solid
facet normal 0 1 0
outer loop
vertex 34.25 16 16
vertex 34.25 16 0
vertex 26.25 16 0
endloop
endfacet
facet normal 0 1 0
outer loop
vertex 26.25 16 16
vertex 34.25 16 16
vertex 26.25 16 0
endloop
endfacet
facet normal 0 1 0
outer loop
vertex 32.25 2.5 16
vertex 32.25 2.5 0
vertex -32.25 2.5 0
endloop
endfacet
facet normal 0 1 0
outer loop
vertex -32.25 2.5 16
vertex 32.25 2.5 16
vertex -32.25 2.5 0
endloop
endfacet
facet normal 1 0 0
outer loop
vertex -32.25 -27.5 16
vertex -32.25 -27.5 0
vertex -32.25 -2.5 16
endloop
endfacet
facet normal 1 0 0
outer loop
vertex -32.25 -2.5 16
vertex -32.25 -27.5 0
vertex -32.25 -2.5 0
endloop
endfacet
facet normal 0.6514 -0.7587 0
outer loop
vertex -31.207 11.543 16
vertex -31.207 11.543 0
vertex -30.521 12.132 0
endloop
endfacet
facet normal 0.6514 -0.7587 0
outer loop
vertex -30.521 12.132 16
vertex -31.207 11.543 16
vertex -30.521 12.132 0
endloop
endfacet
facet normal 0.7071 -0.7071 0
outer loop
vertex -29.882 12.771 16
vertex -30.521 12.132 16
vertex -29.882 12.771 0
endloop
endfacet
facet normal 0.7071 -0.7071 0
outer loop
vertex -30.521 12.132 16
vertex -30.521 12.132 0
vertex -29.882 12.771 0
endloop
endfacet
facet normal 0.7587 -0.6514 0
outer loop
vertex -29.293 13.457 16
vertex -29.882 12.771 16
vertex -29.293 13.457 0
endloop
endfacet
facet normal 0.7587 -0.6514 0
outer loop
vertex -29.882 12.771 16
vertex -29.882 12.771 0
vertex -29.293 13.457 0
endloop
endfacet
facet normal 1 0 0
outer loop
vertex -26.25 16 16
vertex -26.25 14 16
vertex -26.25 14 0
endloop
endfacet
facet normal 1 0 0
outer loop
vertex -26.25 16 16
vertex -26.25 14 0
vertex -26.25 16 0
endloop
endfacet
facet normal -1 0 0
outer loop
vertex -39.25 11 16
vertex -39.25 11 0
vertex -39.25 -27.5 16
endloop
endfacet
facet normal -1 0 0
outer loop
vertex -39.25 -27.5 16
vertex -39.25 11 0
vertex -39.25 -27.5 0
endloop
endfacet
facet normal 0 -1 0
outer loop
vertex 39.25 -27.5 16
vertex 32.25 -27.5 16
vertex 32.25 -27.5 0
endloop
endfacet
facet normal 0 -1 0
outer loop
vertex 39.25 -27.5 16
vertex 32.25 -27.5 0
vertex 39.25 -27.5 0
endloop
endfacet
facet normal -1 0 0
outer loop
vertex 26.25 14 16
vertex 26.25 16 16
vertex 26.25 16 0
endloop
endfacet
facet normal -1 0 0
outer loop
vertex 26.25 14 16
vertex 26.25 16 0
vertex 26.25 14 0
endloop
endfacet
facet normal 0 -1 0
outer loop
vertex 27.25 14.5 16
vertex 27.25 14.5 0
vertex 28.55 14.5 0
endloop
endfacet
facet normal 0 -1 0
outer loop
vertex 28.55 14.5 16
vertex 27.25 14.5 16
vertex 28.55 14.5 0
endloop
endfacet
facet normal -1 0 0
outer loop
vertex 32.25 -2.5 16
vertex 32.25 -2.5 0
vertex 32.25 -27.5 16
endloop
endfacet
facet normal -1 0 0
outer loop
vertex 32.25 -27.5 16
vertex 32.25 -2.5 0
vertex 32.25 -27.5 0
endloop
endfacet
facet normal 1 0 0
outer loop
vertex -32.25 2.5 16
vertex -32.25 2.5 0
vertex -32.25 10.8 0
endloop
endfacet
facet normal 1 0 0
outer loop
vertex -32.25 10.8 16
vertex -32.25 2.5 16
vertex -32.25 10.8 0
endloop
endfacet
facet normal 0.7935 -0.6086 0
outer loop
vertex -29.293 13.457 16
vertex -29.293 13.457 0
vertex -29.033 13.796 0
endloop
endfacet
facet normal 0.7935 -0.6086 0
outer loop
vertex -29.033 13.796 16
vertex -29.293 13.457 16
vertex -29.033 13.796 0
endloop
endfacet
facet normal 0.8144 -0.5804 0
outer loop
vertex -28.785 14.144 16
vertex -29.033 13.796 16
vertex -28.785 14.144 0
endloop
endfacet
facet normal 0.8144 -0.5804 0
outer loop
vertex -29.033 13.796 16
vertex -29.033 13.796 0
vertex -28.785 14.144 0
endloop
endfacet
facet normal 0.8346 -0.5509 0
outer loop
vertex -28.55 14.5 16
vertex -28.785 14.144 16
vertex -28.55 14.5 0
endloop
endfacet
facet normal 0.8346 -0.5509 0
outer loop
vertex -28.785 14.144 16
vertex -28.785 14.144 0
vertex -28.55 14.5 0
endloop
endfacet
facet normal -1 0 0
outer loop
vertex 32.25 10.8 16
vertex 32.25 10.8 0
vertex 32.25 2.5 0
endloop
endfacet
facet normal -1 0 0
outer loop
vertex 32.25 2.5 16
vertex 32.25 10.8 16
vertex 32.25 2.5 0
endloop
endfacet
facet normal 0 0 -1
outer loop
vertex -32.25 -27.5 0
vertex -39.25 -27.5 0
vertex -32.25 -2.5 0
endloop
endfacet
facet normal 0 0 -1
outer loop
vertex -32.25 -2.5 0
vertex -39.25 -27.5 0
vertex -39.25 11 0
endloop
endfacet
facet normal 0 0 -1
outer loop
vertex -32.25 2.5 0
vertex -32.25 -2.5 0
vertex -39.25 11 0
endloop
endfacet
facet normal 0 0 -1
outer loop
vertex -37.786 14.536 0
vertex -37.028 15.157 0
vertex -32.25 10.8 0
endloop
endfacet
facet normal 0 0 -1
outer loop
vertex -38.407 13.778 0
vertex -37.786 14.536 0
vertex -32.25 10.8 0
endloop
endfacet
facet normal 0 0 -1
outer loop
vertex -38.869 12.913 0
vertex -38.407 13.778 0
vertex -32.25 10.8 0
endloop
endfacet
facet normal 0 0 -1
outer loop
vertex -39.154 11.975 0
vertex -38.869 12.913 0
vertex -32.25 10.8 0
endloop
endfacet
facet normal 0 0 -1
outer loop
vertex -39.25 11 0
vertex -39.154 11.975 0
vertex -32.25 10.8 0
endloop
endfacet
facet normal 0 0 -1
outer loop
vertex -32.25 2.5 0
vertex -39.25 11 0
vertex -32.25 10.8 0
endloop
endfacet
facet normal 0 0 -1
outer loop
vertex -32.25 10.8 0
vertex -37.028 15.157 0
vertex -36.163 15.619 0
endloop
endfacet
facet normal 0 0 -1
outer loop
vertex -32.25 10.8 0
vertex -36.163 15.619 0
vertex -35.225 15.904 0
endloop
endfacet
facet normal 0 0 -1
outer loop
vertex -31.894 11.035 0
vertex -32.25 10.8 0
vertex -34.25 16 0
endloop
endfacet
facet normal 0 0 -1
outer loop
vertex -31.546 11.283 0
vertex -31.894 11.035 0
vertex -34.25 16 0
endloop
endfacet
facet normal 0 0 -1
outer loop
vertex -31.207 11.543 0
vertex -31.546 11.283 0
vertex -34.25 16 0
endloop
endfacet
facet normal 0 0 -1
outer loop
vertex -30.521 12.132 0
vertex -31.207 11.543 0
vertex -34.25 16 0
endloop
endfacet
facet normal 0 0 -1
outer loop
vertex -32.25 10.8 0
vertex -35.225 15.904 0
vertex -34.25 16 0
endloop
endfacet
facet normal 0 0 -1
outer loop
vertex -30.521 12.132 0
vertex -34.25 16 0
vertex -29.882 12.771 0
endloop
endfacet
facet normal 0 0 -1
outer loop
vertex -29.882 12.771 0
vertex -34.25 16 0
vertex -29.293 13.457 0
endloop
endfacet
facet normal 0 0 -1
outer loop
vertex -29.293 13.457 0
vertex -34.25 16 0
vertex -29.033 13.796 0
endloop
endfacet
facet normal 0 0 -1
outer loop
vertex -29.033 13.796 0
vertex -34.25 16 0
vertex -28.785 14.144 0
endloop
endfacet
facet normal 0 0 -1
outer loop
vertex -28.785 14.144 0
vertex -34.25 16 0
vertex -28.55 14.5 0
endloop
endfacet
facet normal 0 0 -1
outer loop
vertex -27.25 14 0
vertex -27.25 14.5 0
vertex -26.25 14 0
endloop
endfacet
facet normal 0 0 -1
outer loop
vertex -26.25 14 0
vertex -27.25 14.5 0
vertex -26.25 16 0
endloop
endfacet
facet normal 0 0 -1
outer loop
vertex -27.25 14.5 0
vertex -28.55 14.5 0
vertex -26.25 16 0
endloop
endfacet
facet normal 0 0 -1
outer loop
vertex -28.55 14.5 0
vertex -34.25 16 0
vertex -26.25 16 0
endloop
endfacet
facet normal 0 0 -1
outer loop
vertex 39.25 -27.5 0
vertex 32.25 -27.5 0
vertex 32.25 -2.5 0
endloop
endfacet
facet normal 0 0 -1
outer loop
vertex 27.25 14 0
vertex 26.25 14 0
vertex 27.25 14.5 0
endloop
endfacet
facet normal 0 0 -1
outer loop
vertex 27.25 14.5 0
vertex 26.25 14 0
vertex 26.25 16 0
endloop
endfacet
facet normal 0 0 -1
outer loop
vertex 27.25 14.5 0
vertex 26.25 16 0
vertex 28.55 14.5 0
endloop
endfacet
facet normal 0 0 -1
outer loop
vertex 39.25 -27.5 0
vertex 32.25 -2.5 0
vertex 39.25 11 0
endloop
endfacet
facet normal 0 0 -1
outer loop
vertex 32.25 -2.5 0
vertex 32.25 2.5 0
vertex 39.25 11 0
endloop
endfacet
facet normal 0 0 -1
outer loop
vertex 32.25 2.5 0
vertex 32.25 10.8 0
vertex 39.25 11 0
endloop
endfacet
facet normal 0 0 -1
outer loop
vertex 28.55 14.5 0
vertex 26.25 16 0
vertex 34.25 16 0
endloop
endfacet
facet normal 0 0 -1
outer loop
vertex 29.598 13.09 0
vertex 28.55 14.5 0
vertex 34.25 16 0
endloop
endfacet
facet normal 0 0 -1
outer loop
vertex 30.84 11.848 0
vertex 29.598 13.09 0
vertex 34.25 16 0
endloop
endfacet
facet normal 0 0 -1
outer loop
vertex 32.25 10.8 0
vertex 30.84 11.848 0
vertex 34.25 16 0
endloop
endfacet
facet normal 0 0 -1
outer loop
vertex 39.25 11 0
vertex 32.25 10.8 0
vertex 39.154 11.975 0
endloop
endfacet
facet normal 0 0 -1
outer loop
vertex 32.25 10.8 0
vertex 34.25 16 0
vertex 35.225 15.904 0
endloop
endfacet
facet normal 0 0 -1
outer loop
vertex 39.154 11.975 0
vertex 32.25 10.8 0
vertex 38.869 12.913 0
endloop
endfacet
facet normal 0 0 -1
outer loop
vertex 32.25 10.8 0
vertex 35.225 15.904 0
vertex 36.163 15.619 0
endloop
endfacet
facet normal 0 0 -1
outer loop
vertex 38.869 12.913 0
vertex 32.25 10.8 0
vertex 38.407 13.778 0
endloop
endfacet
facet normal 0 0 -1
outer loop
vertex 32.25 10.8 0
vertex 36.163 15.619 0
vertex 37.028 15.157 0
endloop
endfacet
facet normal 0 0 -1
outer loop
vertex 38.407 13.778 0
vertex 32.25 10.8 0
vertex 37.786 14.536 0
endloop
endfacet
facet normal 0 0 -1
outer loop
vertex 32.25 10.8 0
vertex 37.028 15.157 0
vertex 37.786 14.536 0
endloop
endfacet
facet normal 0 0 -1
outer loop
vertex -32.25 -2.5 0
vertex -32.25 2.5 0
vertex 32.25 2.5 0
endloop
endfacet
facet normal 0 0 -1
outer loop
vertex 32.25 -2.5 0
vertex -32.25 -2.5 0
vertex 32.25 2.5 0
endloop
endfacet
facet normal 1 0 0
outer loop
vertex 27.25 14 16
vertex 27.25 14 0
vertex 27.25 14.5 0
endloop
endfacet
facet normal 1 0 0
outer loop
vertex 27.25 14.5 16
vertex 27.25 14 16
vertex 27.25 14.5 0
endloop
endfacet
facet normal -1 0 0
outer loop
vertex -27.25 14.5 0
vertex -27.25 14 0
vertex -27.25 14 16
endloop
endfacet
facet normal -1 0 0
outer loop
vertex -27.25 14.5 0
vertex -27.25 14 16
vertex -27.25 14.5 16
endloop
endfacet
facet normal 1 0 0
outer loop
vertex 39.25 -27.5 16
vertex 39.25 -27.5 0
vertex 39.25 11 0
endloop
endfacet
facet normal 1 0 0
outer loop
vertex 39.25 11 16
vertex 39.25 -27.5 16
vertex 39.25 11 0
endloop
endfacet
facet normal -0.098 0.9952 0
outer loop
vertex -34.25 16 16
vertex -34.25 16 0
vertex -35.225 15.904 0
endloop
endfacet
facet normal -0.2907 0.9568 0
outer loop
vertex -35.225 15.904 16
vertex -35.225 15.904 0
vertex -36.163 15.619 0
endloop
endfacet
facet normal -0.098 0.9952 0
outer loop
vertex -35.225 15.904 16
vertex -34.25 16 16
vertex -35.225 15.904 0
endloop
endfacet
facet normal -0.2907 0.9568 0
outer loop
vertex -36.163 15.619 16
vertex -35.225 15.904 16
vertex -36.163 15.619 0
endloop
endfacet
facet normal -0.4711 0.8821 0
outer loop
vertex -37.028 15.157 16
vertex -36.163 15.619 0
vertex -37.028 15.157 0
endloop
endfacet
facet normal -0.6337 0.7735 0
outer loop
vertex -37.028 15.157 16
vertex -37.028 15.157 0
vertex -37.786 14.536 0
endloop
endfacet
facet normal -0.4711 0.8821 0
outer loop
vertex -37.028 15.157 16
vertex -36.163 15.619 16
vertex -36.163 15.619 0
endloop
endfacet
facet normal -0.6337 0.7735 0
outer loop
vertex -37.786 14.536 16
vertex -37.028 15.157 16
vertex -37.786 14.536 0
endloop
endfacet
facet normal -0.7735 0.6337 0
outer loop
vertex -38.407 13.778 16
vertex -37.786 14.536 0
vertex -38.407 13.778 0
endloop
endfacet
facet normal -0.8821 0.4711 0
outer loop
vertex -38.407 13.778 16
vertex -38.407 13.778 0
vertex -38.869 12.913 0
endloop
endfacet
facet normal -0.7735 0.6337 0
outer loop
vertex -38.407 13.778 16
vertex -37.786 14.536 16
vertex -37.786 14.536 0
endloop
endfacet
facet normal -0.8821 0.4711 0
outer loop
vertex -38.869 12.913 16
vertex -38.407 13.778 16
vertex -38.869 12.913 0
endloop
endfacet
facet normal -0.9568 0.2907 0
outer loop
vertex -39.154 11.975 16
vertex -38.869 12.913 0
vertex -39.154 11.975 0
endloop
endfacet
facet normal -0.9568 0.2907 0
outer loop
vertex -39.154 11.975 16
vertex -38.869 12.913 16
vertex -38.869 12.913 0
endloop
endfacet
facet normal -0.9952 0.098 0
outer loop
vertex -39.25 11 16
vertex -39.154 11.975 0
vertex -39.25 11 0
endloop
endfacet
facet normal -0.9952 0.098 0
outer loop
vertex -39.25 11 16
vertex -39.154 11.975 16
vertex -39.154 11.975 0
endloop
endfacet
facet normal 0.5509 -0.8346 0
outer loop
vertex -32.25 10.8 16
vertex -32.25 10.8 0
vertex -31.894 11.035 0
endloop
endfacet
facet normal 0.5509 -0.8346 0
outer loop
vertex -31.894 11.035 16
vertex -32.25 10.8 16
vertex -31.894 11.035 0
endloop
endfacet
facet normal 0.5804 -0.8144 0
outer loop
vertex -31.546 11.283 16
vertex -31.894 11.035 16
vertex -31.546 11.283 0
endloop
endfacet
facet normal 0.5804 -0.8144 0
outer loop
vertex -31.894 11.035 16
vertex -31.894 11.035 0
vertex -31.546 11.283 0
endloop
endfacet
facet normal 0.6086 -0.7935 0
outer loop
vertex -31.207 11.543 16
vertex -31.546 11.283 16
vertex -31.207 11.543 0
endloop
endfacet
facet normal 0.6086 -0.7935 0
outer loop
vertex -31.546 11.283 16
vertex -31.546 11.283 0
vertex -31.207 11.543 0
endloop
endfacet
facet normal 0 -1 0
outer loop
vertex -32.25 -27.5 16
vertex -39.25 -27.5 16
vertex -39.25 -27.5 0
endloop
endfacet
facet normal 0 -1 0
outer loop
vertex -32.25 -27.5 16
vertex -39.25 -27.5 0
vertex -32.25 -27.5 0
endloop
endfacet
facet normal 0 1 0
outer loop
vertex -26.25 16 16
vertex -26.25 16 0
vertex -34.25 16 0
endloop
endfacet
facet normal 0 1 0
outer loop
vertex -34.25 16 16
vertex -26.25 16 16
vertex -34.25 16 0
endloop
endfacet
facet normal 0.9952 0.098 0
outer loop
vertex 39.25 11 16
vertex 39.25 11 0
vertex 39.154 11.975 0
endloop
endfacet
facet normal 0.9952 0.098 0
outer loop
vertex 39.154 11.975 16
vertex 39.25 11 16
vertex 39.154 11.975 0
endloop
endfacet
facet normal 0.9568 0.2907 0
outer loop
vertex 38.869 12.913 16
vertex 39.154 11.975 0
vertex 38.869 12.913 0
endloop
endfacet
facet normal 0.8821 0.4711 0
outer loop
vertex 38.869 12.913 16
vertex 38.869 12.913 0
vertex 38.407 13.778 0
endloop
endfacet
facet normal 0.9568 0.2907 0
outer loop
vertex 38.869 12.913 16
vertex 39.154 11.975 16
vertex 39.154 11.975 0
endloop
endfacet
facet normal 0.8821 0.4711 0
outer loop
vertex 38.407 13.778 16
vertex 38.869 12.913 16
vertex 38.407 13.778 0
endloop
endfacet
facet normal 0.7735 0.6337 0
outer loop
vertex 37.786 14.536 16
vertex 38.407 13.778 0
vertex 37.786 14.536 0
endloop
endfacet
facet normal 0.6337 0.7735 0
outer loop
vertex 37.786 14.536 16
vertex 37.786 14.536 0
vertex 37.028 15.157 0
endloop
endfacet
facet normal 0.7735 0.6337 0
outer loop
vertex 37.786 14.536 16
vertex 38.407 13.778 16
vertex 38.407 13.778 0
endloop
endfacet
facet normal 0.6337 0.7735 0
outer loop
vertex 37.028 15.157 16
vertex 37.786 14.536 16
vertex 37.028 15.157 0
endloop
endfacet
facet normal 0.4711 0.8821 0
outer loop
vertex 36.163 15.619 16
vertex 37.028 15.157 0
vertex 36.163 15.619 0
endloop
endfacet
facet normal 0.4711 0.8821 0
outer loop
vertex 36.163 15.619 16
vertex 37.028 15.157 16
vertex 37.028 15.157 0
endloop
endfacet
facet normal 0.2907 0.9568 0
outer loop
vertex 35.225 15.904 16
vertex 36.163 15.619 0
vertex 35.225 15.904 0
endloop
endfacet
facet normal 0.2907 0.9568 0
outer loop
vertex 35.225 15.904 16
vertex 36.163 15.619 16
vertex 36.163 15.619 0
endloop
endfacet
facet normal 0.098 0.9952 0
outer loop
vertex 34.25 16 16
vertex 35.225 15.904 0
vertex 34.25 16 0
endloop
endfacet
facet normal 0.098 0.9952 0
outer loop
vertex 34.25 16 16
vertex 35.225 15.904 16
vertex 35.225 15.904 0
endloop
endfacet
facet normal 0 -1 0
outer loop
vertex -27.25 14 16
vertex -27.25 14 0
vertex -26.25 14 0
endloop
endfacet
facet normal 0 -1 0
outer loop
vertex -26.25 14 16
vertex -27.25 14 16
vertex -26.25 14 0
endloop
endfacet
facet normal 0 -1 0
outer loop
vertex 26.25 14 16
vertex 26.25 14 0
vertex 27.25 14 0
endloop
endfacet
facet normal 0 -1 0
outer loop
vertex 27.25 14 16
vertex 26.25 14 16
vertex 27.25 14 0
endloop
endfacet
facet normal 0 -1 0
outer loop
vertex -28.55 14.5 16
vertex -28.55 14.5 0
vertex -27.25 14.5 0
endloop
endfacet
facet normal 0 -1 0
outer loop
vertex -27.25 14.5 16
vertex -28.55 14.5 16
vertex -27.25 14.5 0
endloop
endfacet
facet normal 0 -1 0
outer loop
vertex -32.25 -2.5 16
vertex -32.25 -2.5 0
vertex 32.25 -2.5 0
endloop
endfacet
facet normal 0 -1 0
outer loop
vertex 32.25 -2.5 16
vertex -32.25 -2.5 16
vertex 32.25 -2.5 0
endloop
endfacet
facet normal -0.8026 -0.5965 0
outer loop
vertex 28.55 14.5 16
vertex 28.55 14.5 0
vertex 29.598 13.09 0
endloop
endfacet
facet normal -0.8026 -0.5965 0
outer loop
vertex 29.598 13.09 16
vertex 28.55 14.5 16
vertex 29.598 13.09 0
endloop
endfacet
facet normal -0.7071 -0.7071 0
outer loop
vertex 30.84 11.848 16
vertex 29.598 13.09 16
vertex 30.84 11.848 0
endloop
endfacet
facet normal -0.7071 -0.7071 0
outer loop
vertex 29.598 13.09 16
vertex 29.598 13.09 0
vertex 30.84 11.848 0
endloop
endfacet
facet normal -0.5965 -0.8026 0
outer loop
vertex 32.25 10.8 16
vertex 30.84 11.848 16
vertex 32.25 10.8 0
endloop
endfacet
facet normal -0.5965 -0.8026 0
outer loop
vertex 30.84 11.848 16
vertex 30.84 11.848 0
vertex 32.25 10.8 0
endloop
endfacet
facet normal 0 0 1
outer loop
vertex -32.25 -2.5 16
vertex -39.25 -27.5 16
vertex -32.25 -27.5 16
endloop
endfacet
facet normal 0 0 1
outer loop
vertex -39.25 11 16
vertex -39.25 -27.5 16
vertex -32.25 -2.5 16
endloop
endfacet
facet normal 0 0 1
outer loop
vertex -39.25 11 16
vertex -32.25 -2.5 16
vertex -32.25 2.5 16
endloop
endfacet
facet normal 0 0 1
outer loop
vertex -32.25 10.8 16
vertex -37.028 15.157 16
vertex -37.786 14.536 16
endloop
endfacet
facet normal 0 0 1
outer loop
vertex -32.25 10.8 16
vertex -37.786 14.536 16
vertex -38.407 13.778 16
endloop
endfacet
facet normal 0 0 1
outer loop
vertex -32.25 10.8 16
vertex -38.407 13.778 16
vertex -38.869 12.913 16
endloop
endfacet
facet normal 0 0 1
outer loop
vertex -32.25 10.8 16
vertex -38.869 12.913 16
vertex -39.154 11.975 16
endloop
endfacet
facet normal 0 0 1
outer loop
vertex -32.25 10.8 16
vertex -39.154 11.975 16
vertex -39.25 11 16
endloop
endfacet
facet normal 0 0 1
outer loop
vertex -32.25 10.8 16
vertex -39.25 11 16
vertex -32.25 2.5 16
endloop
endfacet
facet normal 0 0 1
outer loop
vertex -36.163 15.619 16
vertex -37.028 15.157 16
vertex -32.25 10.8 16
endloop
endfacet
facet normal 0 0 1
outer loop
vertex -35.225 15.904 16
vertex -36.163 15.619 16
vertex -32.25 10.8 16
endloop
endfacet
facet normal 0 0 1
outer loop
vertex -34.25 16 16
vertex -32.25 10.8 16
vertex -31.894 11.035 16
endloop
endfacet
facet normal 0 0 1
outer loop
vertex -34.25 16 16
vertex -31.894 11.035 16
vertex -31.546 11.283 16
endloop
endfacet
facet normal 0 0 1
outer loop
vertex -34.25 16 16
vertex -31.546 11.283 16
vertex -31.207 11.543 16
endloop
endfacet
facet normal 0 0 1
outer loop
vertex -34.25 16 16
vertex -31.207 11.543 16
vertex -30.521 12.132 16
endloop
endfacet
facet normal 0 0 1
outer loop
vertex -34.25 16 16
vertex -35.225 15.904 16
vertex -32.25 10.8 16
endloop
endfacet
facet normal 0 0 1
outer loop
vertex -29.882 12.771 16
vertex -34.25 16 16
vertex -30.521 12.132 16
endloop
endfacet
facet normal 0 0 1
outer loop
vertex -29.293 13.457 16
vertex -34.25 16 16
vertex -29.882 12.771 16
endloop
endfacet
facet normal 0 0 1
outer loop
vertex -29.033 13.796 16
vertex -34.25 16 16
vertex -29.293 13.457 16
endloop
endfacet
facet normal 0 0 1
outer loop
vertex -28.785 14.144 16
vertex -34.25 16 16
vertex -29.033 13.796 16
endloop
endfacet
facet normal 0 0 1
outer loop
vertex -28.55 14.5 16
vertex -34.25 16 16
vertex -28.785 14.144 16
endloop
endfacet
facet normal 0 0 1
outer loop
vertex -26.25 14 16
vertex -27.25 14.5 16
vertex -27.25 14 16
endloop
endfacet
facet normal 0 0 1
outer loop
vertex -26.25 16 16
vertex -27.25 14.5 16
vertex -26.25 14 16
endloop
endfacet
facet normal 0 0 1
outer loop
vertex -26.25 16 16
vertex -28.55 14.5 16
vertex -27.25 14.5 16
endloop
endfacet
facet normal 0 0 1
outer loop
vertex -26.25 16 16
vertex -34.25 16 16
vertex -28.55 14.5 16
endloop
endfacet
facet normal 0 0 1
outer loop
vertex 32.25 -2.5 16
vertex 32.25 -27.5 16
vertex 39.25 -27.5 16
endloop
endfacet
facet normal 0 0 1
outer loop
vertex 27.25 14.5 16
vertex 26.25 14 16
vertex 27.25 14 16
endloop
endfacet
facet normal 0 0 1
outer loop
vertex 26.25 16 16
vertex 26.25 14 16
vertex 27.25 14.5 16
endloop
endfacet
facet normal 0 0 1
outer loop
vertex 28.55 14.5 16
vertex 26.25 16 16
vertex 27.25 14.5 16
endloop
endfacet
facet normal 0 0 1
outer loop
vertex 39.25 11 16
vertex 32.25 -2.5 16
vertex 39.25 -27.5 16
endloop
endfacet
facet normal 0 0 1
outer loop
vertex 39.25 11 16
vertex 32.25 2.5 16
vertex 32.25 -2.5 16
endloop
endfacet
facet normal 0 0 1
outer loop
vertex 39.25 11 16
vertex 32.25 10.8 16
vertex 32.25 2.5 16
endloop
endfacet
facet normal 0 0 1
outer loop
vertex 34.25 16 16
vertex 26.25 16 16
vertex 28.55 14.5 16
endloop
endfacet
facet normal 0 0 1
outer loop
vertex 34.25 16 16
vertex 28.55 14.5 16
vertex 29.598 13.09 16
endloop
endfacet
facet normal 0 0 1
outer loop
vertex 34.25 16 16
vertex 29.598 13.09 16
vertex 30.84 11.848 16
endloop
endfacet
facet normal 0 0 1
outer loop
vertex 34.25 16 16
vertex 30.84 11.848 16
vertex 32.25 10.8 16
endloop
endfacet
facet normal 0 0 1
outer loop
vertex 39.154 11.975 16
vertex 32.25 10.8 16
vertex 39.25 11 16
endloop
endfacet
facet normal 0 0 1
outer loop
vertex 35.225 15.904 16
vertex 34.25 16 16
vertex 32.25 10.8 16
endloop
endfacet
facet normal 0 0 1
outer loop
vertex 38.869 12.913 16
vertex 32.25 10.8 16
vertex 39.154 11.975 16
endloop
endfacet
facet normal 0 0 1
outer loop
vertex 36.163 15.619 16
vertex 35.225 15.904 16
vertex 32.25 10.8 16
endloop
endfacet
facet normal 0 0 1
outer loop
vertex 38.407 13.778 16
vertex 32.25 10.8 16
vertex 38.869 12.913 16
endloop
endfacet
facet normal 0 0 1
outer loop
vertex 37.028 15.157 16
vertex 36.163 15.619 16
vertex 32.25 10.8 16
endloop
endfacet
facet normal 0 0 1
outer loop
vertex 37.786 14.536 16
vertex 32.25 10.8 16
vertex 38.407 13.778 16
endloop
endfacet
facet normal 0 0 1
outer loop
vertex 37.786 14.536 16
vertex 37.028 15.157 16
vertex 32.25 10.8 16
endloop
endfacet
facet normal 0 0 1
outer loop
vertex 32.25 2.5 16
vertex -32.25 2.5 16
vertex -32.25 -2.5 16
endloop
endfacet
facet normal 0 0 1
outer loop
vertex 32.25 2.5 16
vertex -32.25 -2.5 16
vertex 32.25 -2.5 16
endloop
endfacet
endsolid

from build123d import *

# Parameters (mm, degrees)
F0_W     = 1
F0_H     = 0.5
F1_DEPTH = 16
F2_R     = 5


with BuildPart() as f1:
    # F0 (on Top) → F1 (new body)
    with BuildSketch(Plane.XY):
        Polygon((32.25, -2.5), (32.25, 2.5), (28.25, 2.5), (-28.25, 2.5), (-32.25, 2.5), (-32.25, -2.5), align=None)
        Polygon((32.25, 10.8), (32.25, 2.5), (32.25, -2.5), (32.25, -27.5), (39.25, -27.5), (39.25, 14.5), (32.25, 14.5), align=None)
        with BuildLine():
            ThreePointArc((28.55, 14.5), (30.1958719271, 12.4458719271), (32.25, 10.8))
            Line((32.25, 10.8), (32.25, 14.5))
            Line((32.25, 14.5), (28.55, 14.5))
        make_face()
        Polygon((27.25, 14.5), (28.25, 14.5), (28.55, 14.5), (32.25, 14.5), (39.25, 14.5), (39.25, 16), (26.25, 16), (26.25, 14.5), align=None)
        Polygon((-32.25, -27.5), (-32.25, -2.5), (-32.25, 2.5), (-39.25, 2.5), (-39.25, -27.5), align=None)
        Polygon((-39.25, 2.5), (-32.25, 2.5), (-32.25, 10.5), (-32.25, 10.8), (-32.25, 14.5), (-39.25, 14.5), align=None)
        with Locations((26.75, 14.25)):
            Rectangle(F0_W, F0_H)
        Polygon((-28.55, 14.5), (-28.25, 14.5), (-27.25, 14.5), (-26.25, 14.5), (-26.25, 16), (-39.25, 16), (-39.25, 14.5), (-32.25, 14.5), align=None)
        with BuildLine():
            Line((-32.25, 14.5), (-32.25, 10.8))
            ThreePointArc((-32.25, 10.8), (-31.7185283382, 11.1576250938), (-31.2068981187, 11.5431018813))
            Line((-31.2068981187, 11.5431018813), (-29.2931018813, 13.4568981187))
            ThreePointArc((-29.2931018813, 13.4568981187), (-28.9076250938, 13.9685283382), (-28.55, 14.5))
            Line((-28.55, 14.5), (-32.25, 14.5))
        make_face()
        with Locations((-26.75, 14.25)):
            Rectangle(F0_W, F0_H)
        with BuildLine():
            Line((-29.2931018813, 13.4568981187), (-31.2068981187, 11.5431018813))
            ThreePointArc((-31.2068981187, 11.5431018813), (-30.1958719271, 12.4458719271), (-29.2931018813, 13.4568981187))
        make_face()
    extrude(amount=F1_DEPTH)

    # F2
    f2_edges = [f1.edges().sort_by_distance(p)[0] for p in [
        (-39.25, 16, 8),
        (39.25, 16, 8),
    ]]
    fillet(f2_edges, radius=F2_R)


solid = f1.part
